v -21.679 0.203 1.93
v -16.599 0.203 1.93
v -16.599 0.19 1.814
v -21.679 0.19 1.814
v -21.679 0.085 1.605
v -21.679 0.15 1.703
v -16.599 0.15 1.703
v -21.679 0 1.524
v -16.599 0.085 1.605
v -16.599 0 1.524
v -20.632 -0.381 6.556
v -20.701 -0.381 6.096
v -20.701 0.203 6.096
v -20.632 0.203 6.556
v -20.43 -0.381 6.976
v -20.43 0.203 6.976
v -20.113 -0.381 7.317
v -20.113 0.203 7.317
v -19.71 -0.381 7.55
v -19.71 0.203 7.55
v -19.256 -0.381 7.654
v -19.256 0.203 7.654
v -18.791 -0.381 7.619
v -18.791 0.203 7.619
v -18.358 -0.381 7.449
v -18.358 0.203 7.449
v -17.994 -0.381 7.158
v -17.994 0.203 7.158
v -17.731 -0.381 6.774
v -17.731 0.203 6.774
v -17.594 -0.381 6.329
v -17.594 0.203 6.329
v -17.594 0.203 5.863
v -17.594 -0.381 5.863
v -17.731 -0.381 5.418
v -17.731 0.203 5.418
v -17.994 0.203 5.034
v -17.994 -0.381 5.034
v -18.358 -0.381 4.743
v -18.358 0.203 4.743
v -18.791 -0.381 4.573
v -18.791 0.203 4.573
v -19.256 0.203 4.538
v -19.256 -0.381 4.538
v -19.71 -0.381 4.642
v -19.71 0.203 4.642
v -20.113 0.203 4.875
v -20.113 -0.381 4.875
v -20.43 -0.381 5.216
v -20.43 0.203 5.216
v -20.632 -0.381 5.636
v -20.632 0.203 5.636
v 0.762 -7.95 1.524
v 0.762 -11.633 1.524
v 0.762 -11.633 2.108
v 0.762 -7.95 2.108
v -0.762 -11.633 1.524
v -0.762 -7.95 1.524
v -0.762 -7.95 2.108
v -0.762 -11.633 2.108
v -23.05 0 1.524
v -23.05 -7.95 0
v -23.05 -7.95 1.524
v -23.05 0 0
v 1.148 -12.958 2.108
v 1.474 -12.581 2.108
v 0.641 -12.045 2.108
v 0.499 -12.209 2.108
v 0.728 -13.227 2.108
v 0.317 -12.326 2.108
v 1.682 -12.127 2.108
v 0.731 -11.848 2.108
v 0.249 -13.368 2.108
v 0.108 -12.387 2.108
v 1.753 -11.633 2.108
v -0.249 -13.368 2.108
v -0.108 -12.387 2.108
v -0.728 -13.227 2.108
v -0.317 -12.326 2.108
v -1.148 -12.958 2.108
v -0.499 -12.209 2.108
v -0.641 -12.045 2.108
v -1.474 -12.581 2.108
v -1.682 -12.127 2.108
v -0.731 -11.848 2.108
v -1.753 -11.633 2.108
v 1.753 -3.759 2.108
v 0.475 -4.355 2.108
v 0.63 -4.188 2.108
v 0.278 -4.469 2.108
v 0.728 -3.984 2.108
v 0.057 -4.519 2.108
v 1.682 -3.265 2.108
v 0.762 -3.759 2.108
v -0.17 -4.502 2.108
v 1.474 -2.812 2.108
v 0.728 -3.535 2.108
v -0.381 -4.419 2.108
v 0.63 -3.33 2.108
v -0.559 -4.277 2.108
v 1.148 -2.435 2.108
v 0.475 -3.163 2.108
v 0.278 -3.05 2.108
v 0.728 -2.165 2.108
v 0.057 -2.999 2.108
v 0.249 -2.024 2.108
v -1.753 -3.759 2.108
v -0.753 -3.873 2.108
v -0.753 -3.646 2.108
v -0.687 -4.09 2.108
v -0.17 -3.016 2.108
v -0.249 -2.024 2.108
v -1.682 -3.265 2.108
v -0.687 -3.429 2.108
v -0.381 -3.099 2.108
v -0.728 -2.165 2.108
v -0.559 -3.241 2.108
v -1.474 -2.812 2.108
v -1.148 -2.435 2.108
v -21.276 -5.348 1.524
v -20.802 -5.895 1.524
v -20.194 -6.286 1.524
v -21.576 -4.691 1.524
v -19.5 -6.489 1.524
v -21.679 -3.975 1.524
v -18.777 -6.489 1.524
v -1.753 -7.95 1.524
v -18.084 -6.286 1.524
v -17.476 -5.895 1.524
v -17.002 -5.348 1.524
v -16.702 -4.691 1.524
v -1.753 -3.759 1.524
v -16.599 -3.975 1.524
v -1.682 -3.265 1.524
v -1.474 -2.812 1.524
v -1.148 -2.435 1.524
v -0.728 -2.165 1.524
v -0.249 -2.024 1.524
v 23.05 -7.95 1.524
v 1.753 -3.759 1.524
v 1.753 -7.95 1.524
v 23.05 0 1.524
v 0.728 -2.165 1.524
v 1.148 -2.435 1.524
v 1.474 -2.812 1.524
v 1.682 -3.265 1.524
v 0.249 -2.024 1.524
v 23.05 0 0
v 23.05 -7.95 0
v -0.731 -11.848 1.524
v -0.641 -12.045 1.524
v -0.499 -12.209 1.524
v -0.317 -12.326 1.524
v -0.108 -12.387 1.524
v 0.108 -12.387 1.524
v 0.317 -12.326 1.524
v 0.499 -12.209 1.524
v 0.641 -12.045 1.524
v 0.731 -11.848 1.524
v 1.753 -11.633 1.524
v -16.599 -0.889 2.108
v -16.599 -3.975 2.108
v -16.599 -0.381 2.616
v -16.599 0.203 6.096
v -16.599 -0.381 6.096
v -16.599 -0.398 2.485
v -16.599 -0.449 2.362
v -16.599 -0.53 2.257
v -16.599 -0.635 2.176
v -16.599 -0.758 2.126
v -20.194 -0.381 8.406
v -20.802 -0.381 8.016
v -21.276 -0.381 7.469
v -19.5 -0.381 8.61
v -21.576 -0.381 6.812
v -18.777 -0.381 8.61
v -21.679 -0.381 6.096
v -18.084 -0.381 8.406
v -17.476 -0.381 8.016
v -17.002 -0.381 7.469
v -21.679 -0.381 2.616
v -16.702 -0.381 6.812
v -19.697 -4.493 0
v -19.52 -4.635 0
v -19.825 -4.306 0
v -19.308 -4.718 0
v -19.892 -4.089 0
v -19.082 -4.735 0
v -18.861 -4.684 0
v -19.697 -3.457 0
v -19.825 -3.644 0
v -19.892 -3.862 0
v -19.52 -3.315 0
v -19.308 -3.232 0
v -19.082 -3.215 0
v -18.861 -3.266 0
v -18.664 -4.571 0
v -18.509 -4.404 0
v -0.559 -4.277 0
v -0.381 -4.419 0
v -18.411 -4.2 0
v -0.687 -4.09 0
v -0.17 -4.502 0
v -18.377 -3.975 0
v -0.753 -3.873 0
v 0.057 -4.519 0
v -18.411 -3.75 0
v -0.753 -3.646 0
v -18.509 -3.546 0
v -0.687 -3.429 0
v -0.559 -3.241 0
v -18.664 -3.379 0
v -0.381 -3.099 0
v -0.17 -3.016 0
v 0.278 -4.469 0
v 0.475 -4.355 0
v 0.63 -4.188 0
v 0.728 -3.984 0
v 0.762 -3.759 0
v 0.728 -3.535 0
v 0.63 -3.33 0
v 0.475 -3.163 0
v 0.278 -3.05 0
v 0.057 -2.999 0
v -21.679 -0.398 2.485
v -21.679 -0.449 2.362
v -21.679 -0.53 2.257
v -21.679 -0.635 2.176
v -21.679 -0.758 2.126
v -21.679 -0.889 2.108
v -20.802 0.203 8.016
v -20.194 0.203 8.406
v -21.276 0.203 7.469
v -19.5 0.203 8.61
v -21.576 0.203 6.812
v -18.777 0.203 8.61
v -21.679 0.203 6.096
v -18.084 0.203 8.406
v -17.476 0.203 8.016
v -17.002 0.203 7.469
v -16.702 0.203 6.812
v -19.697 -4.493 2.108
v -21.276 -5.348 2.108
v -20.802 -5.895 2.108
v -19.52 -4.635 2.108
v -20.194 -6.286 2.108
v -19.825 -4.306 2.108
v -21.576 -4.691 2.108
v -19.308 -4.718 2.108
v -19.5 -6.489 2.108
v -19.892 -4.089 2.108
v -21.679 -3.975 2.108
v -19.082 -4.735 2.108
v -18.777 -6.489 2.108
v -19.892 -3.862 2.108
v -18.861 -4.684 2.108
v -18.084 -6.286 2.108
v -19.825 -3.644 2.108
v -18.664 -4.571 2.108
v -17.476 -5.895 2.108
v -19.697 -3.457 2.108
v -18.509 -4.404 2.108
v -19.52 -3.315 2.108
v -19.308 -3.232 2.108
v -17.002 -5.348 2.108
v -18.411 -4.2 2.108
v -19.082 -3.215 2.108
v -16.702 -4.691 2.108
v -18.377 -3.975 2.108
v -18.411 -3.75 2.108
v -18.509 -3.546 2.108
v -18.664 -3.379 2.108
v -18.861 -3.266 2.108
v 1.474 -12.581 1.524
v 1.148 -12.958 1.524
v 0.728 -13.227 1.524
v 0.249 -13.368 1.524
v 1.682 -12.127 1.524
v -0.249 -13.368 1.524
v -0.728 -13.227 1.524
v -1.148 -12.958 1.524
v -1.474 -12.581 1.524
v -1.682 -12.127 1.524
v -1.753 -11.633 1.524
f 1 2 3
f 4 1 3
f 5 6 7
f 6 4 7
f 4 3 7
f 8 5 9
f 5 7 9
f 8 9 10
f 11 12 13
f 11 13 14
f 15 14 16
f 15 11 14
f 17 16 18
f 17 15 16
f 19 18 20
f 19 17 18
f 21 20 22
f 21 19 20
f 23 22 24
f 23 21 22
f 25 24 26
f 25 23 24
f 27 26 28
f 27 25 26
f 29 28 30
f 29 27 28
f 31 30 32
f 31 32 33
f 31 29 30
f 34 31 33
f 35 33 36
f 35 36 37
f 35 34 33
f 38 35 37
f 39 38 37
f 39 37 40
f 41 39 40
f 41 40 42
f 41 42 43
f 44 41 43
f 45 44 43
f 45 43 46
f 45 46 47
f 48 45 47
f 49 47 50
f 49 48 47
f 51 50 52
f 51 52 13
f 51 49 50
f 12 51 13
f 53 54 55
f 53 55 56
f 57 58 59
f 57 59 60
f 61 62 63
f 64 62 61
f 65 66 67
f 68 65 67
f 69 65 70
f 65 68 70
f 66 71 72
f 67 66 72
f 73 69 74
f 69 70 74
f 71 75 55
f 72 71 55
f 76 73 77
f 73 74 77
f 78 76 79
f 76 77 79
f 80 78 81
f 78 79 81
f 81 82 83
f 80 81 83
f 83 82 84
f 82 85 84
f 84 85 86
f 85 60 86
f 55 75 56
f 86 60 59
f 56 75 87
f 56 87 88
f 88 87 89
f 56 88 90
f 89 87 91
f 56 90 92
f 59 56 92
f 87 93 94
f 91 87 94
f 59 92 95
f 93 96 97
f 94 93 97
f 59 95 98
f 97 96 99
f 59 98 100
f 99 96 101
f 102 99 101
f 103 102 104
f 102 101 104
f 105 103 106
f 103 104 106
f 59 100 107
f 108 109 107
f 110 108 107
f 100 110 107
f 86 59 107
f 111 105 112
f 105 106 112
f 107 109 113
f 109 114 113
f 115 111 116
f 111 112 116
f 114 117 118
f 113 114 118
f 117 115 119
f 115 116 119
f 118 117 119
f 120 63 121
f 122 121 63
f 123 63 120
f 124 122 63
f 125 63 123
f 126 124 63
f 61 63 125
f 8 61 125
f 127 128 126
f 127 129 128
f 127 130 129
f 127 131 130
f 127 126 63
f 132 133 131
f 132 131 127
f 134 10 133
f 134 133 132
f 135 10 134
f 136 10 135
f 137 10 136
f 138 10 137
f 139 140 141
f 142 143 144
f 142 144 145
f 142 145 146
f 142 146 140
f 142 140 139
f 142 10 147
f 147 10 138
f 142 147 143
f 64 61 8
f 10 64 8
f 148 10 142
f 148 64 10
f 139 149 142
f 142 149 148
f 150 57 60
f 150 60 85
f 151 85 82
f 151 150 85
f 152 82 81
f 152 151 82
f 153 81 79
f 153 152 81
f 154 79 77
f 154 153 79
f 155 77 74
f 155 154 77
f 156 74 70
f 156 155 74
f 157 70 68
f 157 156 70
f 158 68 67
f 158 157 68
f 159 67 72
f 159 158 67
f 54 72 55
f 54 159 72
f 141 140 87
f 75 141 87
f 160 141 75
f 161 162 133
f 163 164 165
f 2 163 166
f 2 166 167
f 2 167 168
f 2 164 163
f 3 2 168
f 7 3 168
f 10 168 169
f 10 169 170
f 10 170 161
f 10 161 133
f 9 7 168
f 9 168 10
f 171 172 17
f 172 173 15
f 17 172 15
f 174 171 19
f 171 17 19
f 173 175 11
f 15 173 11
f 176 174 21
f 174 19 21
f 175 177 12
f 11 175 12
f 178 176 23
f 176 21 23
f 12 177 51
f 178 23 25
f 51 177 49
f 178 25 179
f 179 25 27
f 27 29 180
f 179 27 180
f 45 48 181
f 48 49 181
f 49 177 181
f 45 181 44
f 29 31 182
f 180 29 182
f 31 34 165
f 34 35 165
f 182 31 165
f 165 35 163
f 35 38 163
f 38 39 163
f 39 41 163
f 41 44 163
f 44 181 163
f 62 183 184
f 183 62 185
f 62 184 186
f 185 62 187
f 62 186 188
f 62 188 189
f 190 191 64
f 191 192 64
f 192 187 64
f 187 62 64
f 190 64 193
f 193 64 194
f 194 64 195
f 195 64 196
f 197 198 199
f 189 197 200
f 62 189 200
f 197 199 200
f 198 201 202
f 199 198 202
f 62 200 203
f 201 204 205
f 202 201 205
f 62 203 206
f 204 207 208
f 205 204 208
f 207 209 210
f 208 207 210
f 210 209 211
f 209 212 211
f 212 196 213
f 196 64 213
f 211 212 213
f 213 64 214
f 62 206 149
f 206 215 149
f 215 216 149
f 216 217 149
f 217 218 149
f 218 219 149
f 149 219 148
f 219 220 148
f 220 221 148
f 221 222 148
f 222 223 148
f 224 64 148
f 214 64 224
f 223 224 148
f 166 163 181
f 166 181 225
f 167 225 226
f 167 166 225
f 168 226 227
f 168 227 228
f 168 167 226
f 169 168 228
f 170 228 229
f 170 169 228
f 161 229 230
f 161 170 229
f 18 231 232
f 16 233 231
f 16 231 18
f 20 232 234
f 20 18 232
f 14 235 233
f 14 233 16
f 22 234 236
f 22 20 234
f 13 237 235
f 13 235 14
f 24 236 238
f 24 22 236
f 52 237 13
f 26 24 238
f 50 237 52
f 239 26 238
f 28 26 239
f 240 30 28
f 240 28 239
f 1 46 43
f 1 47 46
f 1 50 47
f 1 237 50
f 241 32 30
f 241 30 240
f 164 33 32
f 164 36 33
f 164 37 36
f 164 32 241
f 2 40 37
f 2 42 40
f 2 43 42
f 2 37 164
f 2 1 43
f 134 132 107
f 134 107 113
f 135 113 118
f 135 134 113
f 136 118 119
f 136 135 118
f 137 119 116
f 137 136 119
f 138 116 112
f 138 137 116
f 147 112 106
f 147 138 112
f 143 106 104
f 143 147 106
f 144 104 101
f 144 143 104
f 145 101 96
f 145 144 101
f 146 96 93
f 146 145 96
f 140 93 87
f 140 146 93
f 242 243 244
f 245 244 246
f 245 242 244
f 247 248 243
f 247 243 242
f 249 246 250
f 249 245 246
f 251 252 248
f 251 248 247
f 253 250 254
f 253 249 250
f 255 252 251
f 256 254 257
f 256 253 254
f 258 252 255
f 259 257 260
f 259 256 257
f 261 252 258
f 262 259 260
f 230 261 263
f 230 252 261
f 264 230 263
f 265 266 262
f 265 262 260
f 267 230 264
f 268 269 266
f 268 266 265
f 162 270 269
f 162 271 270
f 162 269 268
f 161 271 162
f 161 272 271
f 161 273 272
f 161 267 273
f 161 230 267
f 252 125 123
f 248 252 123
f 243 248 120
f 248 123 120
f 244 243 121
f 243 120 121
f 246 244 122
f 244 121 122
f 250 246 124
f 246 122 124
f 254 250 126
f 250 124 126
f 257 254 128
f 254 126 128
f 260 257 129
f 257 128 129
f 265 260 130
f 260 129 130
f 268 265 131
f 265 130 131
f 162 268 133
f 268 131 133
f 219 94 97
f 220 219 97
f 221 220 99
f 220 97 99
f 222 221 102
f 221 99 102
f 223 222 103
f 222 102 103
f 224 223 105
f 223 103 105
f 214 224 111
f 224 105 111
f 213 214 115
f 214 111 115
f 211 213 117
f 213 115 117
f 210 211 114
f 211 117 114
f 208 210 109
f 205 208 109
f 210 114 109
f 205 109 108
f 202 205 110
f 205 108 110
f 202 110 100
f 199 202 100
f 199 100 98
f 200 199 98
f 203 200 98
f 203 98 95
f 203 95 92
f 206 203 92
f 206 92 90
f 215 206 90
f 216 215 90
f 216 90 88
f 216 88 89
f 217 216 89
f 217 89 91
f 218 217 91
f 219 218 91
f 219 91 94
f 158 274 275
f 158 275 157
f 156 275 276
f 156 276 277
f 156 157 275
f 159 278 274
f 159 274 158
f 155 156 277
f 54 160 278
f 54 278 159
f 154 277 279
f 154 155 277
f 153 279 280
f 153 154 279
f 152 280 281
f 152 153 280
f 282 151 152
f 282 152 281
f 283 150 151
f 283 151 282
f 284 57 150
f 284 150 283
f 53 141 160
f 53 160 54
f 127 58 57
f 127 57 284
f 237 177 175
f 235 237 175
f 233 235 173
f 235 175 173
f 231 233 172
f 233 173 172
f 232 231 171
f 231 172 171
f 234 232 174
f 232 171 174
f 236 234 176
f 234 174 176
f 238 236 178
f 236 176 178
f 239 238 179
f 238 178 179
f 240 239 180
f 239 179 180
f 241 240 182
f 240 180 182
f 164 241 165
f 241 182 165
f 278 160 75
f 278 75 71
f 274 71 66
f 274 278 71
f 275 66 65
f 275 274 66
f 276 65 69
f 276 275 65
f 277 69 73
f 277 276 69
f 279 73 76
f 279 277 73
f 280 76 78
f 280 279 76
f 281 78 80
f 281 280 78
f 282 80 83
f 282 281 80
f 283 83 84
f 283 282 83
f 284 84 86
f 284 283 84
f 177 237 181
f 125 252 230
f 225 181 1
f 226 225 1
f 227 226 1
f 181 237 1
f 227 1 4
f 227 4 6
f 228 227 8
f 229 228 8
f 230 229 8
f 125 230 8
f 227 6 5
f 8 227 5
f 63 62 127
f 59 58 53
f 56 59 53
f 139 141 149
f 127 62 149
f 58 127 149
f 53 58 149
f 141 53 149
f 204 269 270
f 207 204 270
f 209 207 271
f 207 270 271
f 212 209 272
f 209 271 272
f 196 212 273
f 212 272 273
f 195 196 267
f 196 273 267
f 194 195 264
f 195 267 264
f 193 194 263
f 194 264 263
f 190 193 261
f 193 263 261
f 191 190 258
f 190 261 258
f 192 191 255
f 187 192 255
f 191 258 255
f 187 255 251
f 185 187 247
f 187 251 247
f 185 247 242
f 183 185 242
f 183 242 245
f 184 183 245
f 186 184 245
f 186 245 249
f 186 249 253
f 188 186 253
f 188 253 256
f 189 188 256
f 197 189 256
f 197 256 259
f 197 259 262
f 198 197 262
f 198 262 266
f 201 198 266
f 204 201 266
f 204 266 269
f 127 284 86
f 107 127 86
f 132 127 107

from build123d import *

# Parameters (mm, degrees)
SKETCH_1_W          = 46.101
SKETCH_1_H          = 7.9502
EXTRUDE_1_DEPTH     = 1.524
EXTRUDE_2_DEPTH     = 0.5842
SKETCH_3_R          = 1.5621
EXTRUDE_3_DEPTH     = 0.5842
FILLET_1_R          = 0.508
SKETCH_4_R          = 0.762
CUT_EXTRUDE_4_DEPTH = 26.241699688
EXTRUDE_5_DEPTH     = 0.5842
SKETCH_6_R          = 0.762
CUT_EXTRUDE_6_DEPTH = 28.442983889


with BuildPart() as part:
    # 草圖1 → 伸長1 (new body)
    with BuildSketch(Plane.XY):
        with Locations((0, -3.9751)):
            Rectangle(SKETCH_1_W, SKETCH_1_H)
    extrude(amount=EXTRUDE_1_DEPTH)

    # 草圖2 → 伸長2 (add)
    with BuildSketch(Plane.XY.offset(1.524)):
        with BuildLine():
            Line((-21.6789, -0.381), (-21.6789, -3.9751))
            ThreePointArc((-21.6789, -3.9751), (-19.1389, -6.5151), (-16.5989, -3.9751))
            Line((-16.5989, -3.9751), (-16.5989, -0.381))
            Line((-16.5989, -0.381), (-21.6789, -0.381))
        make_face()
    extrude(amount=EXTRUDE_2_DEPTH)

    # 草圖3 → 伸長3 (add)
    with BuildSketch(Plane(origin=(0, -0.381, 0), x_dir=(1, 0, 0), z_dir=(0, 1, 0))):
        with BuildLine():
            Line((-16.5989, -1.524), (-21.6789, -1.524))
            Line((-21.6789, -1.524), (-21.6789, -6.096))
            ThreePointArc((-21.6789, -6.096), (-19.1389, -8.636), (-16.5989, -6.096))
            Line((-16.5989, -6.096), (-16.5989, -1.524))
        make_face()
        with Locations(Location((-19.1389, -6.096, 0), (0, 0, 180))):
            Circle(SKETCH_3_R, mode=Mode.SUBTRACT)
    extrude(amount=EXTRUDE_3_DEPTH)

    # 圓角1
    # the kernel refuses this fillet: 0.508 mm, written as the material it adds along each edge
    with BuildSketch(Plane(origin=(-16.5989, -0.381, 2.1082), x_dir=(0, 0, 1), z_dir=(-1, 0, 0))) as fillet_1_piece_1:
        with BuildLine():
            CenterArc((FILLET_1_R, -FILLET_1_R), FILLET_1_R, 90, 90)
            Line((0, -FILLET_1_R), (0, 0))
            Line((0, 0), (FILLET_1_R, 0))
        make_face()
    extrude(amount=5.08)
    # the kernel refuses this fillet: 0.508 mm, written as the material it takes off along each edge
    with BuildSketch(Plane(origin=(-15.5829, 0.2032, 1.524), x_dir=(0, -1.0, 2.6096797513364413e-11), z_dir=(-1, 0, 0))) as fillet_1_2_piece_1:
        with BuildLine():
            CenterArc((0.508, 0.4064), FILLET_1_R, 179.999999999, 53.130102355)
            Line((0, 0.4064), (0, 0))
            Line((0, 0), (0.2032, 0))
        make_face()
    extrude(amount=7.112, mode=Mode.SUBTRACT)

    # 草圖4 → 伸長4 (cut, through all)
    with BuildSketch(Plane.XY.offset(2.1082)):
        with Locations((-19.1389, -3.9751)):
            Circle(SKETCH_4_R)
    extrude(amount=-CUT_EXTRUDE_4_DEPTH, mode=Mode.SUBTRACT)

    # 草圖5 → 伸長5 (add)
    with BuildSketch(Plane.XY.offset(1.524)):
        with BuildLine():
            Line((-1.7526, -11.6332), (-1.7526, -3.7592))
            ThreePointArc((-1.7526, -3.7592), (0, -2.0066), (1.7526, -3.7592))
            Line((1.7526, -3.7592), (1.7526, -11.6332))
            ThreePointArc((1.7526, -11.6332), (0, -13.3858), (-1.7526, -11.6332))
        make_face()
        with BuildLine():
            Line((-0.762, -7.9502), (-0.762, -11.6332))
            ThreePointArc((-0.762, -11.6332), (0, -12.3952), (0.762, -11.6332))
            Line((0.762, -11.6332), (0.762, -7.9502))
            Line((0.762, -7.9502), (-0.762, -7.9502))
        make_face(mode=Mode.SUBTRACT)
    extrude(amount=EXTRUDE_5_DEPTH)

    # 草圖6 → 伸長6 (cut, through all)
    with BuildSketch(Plane.XY.offset(2.1082)):
        with Locations((0, -3.7592)):
            Circle(SKETCH_6_R)
    extrude(amount=-CUT_EXTRUDE_6_DEPTH, mode=Mode.SUBTRACT)


solid = part.part
